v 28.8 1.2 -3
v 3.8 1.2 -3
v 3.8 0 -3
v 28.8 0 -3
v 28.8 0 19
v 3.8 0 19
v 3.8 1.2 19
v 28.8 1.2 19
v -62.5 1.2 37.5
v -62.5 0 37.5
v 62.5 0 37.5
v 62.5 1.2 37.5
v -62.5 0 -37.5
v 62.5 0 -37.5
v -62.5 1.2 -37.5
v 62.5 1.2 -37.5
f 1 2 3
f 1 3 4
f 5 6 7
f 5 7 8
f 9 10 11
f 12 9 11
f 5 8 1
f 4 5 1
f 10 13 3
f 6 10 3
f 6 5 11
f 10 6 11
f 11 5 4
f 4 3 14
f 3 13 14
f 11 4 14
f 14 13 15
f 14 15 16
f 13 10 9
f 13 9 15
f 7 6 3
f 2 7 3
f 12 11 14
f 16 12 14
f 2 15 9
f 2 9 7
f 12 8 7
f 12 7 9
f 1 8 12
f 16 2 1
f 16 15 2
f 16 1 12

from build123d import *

# Parameters (mm, degrees)
SKETCH1_W               = 125
SKETCH1_H               = 75
SKETCH1_W_2             = 22
SKETCH1_H_2             = 22
BOSS_EXTRUDE1_DEPTH     = 1.2
SKETCH2_W               = 3
SKETCH2_H               = 22
CUT_EXTRUDE1_DEPTH      = 1
CUT_EXTRUDE1_DEPTH_BACK = 2.2


with BuildPart() as part:
    # Sketch1 → Boss-Extrude1 (new body)
    with BuildSketch(Plane(origin=(0, 0, 0), x_dir=(1, 0, 0), z_dir=(0, 1, 0))):
        Rectangle(SKETCH1_W, SKETCH1_H)
        with Locations((14.8, -8)):
            Rectangle(SKETCH1_W_2, SKETCH1_H_2, mode=Mode.SUBTRACT)
    extrude(amount=BOSS_EXTRUDE1_DEPTH)

    # Sketch2 → Cut-Extrude1 (cut, two sides)
    with BuildSketch(Plane(origin=(0, 1.2, 0), x_dir=(1, 0, 0), z_dir=(0, 1, 0))) as cut_extrude1_sk:
        with Locations((27.3, -8)):
            Rectangle(SKETCH2_W, SKETCH2_H)
    extrude(amount=CUT_EXTRUDE1_DEPTH, mode=Mode.SUBTRACT)
    extrude(cut_extrude1_sk.sketch, amount=-CUT_EXTRUDE1_DEPTH_BACK, mode=Mode.SUBTRACT)


solid = part.part
